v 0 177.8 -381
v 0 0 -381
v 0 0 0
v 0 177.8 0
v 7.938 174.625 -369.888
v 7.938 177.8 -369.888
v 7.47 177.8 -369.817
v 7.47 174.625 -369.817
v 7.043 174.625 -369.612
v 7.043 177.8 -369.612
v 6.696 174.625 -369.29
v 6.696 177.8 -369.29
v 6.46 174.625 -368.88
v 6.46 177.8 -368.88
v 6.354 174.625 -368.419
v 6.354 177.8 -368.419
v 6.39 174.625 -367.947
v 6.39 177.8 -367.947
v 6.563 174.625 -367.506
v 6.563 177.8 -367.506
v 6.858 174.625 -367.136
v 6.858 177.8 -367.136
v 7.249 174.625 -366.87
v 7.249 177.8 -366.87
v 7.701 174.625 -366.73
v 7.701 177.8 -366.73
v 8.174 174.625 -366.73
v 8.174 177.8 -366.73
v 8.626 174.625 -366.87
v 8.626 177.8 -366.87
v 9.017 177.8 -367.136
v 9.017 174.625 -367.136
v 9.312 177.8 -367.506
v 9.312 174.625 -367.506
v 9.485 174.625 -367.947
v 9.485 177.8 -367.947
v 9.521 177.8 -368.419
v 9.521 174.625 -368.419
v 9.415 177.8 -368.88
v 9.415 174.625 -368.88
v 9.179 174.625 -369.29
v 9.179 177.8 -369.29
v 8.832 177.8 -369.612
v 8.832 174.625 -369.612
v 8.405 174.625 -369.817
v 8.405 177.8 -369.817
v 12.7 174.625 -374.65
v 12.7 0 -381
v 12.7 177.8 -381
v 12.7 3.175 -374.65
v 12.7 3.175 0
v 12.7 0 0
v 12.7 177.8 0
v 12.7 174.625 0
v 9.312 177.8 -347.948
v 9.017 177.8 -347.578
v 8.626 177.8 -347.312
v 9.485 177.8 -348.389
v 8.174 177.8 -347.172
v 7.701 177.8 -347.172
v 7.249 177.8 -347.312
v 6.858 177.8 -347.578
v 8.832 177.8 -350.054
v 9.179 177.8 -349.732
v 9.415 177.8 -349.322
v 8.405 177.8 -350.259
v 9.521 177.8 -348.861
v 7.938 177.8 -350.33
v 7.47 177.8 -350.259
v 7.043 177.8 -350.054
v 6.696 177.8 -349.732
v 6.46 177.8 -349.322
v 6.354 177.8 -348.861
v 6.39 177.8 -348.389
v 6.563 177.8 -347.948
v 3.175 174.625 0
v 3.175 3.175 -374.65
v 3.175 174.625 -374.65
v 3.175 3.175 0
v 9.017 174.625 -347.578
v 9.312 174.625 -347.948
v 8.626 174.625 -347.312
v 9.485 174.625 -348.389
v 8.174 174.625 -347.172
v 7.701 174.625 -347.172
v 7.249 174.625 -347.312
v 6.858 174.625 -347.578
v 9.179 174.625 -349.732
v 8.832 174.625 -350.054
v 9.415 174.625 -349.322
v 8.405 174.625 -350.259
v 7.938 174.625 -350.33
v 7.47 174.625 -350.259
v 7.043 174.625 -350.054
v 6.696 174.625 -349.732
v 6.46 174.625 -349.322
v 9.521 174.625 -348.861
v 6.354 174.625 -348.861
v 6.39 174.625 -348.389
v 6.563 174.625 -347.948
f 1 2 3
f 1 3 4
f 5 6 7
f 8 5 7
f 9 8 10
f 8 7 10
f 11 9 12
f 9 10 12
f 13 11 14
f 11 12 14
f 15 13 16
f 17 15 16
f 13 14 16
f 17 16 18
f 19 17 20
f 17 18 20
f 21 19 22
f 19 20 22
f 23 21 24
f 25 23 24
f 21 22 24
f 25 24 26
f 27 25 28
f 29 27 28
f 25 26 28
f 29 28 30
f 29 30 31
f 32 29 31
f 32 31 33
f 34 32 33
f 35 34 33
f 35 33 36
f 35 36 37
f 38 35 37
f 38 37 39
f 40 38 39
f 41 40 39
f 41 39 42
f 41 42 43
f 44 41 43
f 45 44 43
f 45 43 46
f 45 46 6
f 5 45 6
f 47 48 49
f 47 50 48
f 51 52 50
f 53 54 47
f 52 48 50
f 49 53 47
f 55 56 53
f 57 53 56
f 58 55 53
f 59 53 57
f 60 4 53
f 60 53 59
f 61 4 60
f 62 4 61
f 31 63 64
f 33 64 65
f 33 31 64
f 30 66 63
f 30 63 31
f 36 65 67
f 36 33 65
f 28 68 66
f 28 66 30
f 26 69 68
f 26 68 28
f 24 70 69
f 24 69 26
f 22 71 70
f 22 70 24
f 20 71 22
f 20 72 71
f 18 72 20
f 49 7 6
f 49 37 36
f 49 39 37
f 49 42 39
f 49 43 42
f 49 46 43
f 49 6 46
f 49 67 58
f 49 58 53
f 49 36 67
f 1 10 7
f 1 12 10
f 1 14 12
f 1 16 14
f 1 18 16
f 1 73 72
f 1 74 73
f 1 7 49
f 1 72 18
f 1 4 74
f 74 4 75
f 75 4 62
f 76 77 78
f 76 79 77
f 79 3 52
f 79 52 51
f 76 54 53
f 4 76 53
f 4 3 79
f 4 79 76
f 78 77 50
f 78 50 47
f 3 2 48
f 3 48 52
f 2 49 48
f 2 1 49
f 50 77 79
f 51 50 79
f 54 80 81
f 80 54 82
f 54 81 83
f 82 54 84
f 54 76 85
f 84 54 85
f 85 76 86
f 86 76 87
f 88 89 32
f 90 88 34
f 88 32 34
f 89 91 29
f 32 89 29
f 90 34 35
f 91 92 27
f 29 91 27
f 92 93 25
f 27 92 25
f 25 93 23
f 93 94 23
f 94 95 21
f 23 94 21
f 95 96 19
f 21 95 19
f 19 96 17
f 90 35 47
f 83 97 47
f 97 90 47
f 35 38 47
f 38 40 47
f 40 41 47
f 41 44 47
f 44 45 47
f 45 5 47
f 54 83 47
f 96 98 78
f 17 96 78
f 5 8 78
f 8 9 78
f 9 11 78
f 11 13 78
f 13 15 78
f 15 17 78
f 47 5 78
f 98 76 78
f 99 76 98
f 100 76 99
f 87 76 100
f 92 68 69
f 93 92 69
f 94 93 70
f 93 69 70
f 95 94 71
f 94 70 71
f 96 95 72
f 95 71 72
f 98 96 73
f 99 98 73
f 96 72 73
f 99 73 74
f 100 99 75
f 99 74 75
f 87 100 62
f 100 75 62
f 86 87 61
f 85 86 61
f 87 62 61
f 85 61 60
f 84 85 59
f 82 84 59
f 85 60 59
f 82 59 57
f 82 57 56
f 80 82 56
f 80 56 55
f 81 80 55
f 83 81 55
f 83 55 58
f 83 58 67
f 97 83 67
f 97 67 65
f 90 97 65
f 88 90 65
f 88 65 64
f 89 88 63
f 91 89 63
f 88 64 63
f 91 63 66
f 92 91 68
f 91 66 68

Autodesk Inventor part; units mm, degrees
ref_plane "YZ Plane" through (0, 0, 0) normal (1, 0, 0) x (0, 1, 0)
ref_plane "XZ Plane" through (0, 0, 0) normal (0, 1, 0) x (-1, 0, 0)
ref_plane "XY Plane" through (0, 0, 0) normal (0, 0, 1) x (1, 0, 0)
sketch "Sketch1" plane through (0, 0, 0) normal (1, 0, 0) x (0, 1, 0)
  line L0 (0, 0) -> (177.8, 0)
  line L1 (177.8, 0) -> (177.8, -381)
  line L2 (177.8, -381) -> (0, -381)
  line L3 (0, -381) -> (0, 0)
  line L4 (3.175, 0) -> (174.625, 0)
  line L5 (174.625, 0) -> (174.625, -381)
  line L6 (174.625, -381) -> (3.175, -381)
  line L7 (3.175, -381) -> (3.175, 0)
  line L8 (177.8, -381) -> (0, -381)
  line L9 (0, -381) -> (0, -374.65)
  line L10 (0, -374.65) -> (177.8, -374.65)
  line L11 (177.8, -374.65) -> (177.8, -381)
  dimension "d0" = 177.8
  dimension "d1" = 381
  dimension "d2" = 171.45
  dimension "d3" = 381
  dimension "d4" = 0
  dimension "d5" = 3.175
  dimension "d10" = 6.35
extrude "Extrusion1" add sketch "Sketch1" along normal blind 3.175 contours L0 L5 L10 L7 | L10 L5 L2 L7
extrude "Extrusion2" add sketch "Sketch1" along normal blind 12.7 contours L0 L7 L10 L3 | L10 L7 L2 L3 | L0 L1 L10 L5 | L10 L1 L2 L5
extrude "Extrusion3" add sketch "Sketch1" along normal blind 12.7 contours L10 L7 L2 L3 | L10 L5 L2 L7 | L10 L1 L2 L5
sketch "Sketch2" plane through (3.175, 174.625, 0) normal (0, -1, 0) x (1, 0, 0)
  line L0 (0, 0) -> (0, -374.65) projected
  line L1 (0, 0) -> (0, -368.3)
  line L2 (0, 0) -> (368.3, 0) construction
  line L3 (0, -368.3) -> (0, -348.742)
  line L4 (0, -368.3) -> (4.7625, -368.3)
  line L5 (9.525, -381) -> (9.525, 0) projected
  line L6 (0, -348.742) -> (4.7625, -348.742)
  point P0 (-3.175, 0)
  dimension "d13" = 368.3
  dimension "d14" = 90
  dimension "d15" = 19.558
  dimension "d16" = 4.7625
hole "Hole1" at (7.9375, 174.625, -368.3) at (7.9375, 174.625, -348.742) direction (0, 1, 0) diameter 3.175 depth 25.4 tip angle 118
properties part number "glifPlate"
